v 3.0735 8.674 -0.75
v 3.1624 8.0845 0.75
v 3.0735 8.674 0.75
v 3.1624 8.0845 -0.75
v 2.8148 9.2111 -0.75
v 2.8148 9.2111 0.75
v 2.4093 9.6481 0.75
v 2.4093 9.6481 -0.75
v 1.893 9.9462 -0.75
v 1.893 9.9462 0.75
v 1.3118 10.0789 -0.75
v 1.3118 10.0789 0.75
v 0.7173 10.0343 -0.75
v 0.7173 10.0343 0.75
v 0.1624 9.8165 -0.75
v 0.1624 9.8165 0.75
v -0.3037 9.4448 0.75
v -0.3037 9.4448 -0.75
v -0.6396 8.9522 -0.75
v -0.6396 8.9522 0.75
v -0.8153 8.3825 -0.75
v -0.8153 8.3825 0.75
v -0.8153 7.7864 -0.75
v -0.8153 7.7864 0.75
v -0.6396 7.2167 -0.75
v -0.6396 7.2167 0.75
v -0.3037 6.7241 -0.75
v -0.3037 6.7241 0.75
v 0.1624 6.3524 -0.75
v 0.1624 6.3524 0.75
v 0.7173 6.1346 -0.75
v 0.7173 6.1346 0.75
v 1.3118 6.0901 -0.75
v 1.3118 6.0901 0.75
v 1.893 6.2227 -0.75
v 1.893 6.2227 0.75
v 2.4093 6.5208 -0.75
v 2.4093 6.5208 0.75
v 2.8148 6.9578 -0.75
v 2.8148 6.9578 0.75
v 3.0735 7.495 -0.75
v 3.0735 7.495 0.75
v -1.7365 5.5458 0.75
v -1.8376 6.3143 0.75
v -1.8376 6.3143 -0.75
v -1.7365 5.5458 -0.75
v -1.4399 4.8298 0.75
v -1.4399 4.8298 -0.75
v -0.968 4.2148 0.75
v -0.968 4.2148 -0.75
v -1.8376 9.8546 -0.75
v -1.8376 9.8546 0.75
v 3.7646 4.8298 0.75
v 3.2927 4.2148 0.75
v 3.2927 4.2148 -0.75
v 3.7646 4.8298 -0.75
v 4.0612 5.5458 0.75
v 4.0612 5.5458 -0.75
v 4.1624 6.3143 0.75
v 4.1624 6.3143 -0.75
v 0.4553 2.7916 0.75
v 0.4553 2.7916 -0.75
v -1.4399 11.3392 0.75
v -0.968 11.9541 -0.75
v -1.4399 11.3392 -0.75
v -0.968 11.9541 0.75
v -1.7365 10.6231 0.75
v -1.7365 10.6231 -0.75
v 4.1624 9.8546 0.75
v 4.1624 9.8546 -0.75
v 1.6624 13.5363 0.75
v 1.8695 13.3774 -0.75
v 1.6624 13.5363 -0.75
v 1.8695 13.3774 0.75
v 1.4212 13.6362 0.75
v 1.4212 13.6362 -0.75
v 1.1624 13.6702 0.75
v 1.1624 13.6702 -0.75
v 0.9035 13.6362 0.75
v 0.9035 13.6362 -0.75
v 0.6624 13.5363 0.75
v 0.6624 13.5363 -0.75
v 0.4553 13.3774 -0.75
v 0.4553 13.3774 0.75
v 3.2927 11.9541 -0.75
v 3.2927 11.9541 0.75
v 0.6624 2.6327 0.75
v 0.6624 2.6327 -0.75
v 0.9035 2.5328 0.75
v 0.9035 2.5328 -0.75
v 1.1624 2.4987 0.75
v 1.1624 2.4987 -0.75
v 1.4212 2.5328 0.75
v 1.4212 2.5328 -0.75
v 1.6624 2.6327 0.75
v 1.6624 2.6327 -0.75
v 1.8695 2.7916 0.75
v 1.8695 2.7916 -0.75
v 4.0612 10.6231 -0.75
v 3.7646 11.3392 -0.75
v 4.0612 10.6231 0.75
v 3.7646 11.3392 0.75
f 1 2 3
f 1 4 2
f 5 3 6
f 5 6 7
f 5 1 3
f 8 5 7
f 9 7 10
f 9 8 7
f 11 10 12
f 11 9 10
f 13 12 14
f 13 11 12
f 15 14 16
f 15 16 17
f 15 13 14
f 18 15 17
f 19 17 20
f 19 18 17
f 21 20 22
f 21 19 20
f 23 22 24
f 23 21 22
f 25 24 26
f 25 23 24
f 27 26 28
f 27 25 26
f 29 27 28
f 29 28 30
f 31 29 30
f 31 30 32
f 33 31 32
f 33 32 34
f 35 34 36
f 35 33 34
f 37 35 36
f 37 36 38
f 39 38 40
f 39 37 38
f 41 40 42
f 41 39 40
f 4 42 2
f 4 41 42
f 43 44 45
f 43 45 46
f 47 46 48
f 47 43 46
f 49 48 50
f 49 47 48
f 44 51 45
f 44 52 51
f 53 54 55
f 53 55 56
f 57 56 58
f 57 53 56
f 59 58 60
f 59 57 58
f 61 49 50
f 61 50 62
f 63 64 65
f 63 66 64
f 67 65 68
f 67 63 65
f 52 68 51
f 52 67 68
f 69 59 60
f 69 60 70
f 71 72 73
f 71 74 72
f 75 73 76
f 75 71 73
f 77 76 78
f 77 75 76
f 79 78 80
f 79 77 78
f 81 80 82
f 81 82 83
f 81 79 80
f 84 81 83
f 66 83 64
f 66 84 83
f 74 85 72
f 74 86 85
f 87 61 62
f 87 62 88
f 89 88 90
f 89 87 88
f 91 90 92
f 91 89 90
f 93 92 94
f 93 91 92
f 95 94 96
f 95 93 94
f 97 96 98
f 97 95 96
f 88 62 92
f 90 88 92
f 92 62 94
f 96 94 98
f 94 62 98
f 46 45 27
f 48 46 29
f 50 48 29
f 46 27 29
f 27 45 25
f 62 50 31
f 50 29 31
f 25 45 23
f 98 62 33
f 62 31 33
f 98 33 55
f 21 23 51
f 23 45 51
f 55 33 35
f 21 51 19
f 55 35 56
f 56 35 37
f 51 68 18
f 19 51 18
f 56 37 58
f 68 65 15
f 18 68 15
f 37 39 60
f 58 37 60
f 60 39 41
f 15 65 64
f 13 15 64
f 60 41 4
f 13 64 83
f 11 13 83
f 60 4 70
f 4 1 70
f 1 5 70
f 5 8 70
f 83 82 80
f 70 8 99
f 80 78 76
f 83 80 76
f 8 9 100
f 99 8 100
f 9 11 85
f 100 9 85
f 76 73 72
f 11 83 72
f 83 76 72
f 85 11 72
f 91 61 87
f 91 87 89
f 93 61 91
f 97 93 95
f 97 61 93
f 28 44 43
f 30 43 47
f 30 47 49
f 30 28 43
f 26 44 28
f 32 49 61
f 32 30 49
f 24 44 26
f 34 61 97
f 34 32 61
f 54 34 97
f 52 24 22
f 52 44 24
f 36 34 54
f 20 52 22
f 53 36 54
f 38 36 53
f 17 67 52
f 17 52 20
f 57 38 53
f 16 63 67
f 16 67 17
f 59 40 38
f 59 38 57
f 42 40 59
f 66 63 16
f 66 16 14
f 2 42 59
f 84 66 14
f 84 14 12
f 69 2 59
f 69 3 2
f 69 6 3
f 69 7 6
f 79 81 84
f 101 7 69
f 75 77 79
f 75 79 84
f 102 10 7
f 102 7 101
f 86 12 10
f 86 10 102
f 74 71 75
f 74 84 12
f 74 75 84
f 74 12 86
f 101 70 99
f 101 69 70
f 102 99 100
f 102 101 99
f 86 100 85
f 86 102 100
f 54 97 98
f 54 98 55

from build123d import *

# Parameters (mm, degrees)
SKETCH_1_R      = 2
EXTRUDE_1_DEPTH = 0.75


with BuildPart() as part:
    # Эскиз1 → Бобышка-Вытянуть1 (new, symmetric)
    with BuildSketch(Plane.XY):
        with BuildLine():
            Line((-1.837638241, 9.854632004), (-1.837638241, 6.314293406))
            ThreePointArc((-1.837638241, 6.314293406), (-1.611630943, 5.178077993), (-0.968016612, 4.214841076))
            Line((-0.968016612, 4.214841076), (0.455254978, 2.791569486))
            ThreePointArc((0.455254978, 2.791569486), (1.162361759, 2.498676267), (1.869468541, 2.791569486))
            Line((1.869468541, 2.791569486), (3.292740131, 4.214841076))
            ThreePointArc((3.292740131, 4.214841076), (3.936354462, 5.178077993), (4.162361759, 6.314293406))
            Line((4.162361759, 6.314293406), (4.162361759, 9.854632004))
            ThreePointArc((4.162361759, 9.854632004), (3.936354462, 10.990847417), (3.292740131, 11.954084334))
            Line((3.292740131, 11.954084334), (1.869468541, 13.377355924))
            ThreePointArc((1.869468541, 13.377355924), (1.162361759, 13.670249143), (0.455254978, 13.377355924))
            Line((0.455254978, 13.377355924), (-0.968016612, 11.954084334))
            ThreePointArc((-0.968016612, 11.954084334), (-1.611630943, 10.990847417), (-1.837638241, 9.854632004))
        make_face()
        with Locations((1.162361759, 8.084462705)):
            Circle(SKETCH_1_R, mode=Mode.SUBTRACT)
    extrude(amount=EXTRUDE_1_DEPTH, both=True)


solid = part.part
